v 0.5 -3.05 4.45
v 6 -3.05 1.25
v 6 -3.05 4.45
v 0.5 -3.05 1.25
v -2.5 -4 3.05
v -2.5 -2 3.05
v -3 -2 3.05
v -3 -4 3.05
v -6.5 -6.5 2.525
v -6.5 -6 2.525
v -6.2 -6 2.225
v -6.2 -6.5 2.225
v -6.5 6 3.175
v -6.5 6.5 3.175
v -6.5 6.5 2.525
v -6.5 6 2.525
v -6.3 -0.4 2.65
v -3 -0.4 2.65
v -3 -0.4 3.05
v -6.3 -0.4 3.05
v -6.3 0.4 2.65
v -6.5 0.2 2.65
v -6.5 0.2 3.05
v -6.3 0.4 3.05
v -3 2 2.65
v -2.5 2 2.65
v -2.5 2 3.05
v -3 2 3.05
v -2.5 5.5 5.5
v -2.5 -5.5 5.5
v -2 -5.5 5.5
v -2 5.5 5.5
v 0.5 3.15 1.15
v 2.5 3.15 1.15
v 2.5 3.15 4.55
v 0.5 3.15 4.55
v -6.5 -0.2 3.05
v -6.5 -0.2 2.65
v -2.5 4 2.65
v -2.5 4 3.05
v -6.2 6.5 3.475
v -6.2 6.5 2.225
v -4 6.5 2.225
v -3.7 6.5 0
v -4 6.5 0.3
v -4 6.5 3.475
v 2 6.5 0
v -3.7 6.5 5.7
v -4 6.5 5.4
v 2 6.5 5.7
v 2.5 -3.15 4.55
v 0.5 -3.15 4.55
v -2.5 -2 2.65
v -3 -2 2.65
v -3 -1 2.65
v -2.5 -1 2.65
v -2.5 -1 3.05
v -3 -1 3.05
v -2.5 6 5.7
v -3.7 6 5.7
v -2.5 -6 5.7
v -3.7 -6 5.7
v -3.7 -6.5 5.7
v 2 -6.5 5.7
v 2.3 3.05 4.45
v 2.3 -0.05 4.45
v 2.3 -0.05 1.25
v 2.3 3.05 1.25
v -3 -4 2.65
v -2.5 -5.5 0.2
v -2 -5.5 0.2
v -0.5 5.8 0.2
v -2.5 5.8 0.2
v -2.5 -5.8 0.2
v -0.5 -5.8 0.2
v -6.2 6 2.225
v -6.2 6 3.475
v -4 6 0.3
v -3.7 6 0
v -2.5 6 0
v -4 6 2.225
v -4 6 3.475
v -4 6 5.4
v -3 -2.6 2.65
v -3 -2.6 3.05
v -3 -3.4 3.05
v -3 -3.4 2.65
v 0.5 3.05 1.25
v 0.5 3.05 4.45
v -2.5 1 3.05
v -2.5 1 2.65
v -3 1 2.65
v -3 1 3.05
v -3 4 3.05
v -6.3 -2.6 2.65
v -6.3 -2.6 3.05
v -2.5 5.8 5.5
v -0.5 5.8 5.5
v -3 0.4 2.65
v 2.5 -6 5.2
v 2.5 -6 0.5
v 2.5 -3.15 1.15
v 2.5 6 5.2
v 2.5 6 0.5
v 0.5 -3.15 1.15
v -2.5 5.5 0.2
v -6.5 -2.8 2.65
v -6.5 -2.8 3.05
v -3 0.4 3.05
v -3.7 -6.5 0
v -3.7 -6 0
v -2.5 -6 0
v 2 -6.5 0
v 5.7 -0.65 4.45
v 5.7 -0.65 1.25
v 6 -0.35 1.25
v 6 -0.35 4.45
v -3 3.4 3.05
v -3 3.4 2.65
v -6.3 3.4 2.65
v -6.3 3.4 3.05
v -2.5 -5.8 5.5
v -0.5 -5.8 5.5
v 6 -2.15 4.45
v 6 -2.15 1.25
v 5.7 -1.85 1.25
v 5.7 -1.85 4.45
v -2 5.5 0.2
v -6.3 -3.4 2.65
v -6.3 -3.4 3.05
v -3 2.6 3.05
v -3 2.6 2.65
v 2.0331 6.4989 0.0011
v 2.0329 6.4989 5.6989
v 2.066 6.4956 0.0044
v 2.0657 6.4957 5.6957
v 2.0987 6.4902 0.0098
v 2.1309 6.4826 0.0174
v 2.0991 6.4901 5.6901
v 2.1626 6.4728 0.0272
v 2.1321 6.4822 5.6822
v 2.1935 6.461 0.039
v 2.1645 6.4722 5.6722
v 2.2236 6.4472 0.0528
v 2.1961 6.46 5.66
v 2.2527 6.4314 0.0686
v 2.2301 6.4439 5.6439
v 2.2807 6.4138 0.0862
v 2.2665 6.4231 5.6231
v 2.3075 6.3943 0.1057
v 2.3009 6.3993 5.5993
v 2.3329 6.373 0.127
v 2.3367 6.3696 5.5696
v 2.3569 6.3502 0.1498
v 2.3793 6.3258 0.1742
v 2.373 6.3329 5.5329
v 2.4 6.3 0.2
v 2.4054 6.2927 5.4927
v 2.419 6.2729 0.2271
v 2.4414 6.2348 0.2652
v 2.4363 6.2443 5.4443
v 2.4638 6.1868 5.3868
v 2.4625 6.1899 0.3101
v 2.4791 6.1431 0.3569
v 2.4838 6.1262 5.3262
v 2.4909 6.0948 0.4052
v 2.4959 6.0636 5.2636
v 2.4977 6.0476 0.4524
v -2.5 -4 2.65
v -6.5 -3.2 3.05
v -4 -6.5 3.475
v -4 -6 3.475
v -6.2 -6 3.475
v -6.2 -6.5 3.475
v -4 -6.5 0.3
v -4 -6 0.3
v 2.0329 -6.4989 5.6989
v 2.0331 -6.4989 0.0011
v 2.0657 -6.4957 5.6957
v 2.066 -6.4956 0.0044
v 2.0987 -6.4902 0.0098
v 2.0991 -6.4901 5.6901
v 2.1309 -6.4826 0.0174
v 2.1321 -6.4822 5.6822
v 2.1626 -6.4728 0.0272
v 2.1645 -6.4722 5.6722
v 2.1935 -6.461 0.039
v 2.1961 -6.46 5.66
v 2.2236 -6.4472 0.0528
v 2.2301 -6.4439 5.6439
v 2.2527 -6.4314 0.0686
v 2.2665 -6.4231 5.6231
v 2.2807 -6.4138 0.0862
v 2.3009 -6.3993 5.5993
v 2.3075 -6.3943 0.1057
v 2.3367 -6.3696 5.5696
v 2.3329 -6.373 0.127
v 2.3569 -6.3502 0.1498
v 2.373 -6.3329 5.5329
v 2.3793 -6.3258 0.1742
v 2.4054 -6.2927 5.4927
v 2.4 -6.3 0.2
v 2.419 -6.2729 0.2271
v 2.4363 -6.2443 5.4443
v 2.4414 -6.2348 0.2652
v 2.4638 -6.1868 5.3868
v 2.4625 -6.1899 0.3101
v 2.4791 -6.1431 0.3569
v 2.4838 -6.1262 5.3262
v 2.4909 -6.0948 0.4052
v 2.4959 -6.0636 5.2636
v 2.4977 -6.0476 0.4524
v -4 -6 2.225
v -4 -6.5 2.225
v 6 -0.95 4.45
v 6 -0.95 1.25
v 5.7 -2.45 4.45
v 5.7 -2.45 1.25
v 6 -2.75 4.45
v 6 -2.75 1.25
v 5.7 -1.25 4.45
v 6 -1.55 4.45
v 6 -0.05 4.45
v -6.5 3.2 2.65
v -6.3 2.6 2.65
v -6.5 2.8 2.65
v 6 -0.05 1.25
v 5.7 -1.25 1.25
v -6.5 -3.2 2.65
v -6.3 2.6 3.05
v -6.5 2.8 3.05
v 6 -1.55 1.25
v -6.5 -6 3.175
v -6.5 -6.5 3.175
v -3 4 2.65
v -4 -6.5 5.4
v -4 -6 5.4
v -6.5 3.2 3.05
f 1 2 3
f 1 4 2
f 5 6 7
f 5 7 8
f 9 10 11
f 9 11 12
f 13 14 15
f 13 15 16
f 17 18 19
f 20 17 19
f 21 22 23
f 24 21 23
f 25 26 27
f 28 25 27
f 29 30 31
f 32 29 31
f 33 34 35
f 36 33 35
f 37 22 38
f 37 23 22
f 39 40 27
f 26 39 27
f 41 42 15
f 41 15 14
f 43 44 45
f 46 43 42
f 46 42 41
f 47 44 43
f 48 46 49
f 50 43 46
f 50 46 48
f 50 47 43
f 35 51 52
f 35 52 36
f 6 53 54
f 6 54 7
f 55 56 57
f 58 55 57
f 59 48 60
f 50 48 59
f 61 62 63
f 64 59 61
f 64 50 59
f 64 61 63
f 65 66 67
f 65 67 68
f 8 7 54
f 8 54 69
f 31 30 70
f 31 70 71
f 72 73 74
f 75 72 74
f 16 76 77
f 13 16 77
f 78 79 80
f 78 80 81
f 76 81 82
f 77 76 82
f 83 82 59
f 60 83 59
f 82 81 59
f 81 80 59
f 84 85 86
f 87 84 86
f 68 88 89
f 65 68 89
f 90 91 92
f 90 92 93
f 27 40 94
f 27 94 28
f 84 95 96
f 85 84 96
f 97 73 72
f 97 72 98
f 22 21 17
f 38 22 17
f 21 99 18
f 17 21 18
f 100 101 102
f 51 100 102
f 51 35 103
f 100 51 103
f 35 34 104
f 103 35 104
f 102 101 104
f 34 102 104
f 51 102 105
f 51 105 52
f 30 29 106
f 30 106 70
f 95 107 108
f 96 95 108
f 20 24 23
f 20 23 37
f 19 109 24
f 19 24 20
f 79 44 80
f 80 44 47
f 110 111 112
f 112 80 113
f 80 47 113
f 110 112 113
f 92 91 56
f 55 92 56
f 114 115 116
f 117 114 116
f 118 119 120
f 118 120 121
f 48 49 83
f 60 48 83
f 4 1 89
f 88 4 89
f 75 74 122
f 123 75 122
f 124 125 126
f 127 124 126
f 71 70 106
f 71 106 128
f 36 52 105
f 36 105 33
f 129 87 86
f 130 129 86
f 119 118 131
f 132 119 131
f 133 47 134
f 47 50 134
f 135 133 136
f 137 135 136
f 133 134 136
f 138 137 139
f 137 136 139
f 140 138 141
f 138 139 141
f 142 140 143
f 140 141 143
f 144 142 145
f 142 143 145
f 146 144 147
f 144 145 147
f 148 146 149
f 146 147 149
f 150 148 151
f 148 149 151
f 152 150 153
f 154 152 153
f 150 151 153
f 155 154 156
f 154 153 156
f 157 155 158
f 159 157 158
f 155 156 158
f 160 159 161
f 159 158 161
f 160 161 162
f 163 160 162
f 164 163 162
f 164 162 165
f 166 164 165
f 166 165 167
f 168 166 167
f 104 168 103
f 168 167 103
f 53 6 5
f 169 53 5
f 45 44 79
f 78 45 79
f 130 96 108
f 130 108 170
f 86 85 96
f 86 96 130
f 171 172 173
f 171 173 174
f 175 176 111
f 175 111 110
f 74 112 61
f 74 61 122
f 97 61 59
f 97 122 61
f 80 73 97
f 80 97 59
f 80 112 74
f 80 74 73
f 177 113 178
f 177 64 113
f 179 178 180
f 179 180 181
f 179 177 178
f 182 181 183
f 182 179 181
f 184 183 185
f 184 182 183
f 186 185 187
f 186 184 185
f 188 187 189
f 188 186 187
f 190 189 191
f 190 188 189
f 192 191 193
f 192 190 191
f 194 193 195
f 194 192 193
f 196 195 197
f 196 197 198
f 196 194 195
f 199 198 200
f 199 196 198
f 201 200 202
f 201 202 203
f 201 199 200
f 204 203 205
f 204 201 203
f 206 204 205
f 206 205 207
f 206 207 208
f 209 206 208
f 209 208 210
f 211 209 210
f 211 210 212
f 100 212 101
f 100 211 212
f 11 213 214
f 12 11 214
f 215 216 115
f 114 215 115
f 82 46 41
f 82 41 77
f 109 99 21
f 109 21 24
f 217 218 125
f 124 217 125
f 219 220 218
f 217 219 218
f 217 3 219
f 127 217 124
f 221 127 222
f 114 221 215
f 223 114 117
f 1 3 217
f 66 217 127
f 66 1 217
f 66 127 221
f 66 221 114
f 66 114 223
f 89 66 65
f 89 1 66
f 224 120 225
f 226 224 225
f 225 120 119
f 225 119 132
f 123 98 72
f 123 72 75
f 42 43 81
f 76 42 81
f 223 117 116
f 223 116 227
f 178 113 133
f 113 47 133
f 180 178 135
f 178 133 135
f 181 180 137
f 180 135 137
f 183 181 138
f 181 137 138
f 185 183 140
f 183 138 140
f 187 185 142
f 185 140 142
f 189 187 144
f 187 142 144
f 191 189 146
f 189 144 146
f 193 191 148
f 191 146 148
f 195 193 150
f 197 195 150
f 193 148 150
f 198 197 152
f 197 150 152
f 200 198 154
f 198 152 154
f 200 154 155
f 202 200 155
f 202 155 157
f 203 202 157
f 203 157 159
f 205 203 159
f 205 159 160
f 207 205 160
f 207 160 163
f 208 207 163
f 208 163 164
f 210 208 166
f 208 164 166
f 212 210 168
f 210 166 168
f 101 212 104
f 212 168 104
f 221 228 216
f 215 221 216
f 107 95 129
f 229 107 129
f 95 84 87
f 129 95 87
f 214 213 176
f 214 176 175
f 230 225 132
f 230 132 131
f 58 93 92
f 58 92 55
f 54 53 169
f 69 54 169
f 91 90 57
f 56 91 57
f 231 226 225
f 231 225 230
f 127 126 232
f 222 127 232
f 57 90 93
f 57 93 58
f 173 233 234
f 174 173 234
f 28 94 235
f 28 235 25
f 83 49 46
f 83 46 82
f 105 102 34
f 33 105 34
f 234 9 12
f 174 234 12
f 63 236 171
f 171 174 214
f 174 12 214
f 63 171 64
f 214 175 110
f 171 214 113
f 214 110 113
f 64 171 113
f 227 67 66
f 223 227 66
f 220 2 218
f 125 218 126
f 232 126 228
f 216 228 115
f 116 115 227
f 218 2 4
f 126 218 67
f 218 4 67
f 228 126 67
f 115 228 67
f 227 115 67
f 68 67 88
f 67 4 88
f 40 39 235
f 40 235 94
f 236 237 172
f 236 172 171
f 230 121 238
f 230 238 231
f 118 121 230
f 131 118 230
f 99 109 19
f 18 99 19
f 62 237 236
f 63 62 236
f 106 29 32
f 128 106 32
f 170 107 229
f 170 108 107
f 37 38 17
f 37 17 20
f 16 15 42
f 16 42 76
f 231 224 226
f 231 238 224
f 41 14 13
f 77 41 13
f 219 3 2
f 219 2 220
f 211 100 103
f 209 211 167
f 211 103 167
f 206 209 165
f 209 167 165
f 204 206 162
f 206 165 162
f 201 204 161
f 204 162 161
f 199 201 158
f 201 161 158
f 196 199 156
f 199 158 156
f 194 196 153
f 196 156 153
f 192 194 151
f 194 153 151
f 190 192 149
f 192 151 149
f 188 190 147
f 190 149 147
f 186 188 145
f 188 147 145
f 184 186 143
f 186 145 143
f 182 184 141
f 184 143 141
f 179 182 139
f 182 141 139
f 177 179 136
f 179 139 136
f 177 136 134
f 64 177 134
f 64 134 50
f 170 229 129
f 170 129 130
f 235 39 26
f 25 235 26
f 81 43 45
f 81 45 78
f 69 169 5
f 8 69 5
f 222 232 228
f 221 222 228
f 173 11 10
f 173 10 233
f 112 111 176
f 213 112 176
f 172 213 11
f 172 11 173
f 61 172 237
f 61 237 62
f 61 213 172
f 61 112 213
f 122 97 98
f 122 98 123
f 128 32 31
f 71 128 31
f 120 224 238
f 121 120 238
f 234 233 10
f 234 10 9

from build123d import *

# Parameters (mm, degrees)
F0_W       = 5
F0_H       = 13
F1_DEPTH   = 5.7
F2_W       = 6.3
F2_H       = 3.4
F3_DEPTH   = 2
F4_W       = 6.1
F4_H       = 3.2
F5_DEPTH   = 1.8
F6_W       = 3
F6_H       = 3.2
F7_DEPTH   = 3.7
F8_W       = 0.5
F8_H       = 5.7
F9_DEPTH   = 1.5
F10_R      = 0.5
F11_W      = 11.6
F11_H      = 5.3
F12_DEPTH  = 2
F13_W      = 0.5
F13_H      = 11
F14_DEPTH  = 5.3
F17_DEPTH  = 25
F15_W      = 2
F15_H      = 0.4
F18_DEPTH  = 0.5
F19_W      = 0.8
F19_H      = 0.4
F22_DEPTH  = 3.5
F20_W      = 0.8
F20_H      = 0.4
F21_W      = 0.8
F21_H      = 0.4
F23_W      = 0.5
F23_H      = 1.25
F24_W      = 0.5
F24_H      = 1.25
F25_DEPTH  = 2.5
F26_SIZE   = 0.2
F26_2_SIZE = 0.2
F26_3_SIZE = 0.2
F27_SIZE   = 0.3
F28_SIZE   = 0.3


with BuildPart() as f1:
    # F0 (on Top) → F1 (new body)
    with BuildSketch(Plane.XY):
        Rectangle(F0_W, F0_H)
    extrude(amount=F1_DEPTH)

    # F2 (on face) → F3 (cut)
    with BuildSketch(Plane.YZ.offset(2.5)):
        with Locations((0, 2.85)):
            Rectangle(F2_W, F2_H)
    extrude(amount=-F3_DEPTH, mode=Mode.SUBTRACT)

    # F8 (on face) → F9 (join)
    with BuildSketch(Plane(origin=(-2.5, 0, 0), x_dir=(0, -1, 0), z_dir=(-1, 0, 0))):
        with Locations((-6.25, 2.85)):
            Rectangle(F8_W, F8_H)
        with Locations((6.25, 2.85)):
            Rectangle(F8_W, F8_H)
    extrude(amount=F9_DEPTH)

    # F10
    f10_edges = [f1.edges().sort_by_distance(p)[0] for p in [
        (2.5, 0, 5.7),
        (2.5, 6.5, 2.85),
        (2.5, 0, 0),
        (2.5, -6.5, 2.85),
    ]]
    fillet(f10_edges, radius=F10_R)

    # F11 (on face) → F12 (cut)
    with BuildSketch(Plane(origin=(-2.5, 0, 0), x_dir=(0, -1, 0), z_dir=(-1, 0, 0))):
        with Locations((0, 2.85)):
            Rectangle(F11_W, F11_H)
    extrude(amount=-F12_DEPTH, mode=Mode.SUBTRACT)

    # F23 (on face) + F24 (on face) → F25 (join)
    with BuildSketch(Plane(origin=(-4, 0, 0), x_dir=(0, -1, 0), z_dir=(-1, 0, 0))):
        with Locations((-6.25, 2.85)):
            Rectangle(F23_W, F23_H)
    with BuildSketch(Plane(origin=(-4, 0, 0), x_dir=(0, -1, 0), z_dir=(-1, 0, 0))):
        with Locations((6.25, 2.85)):
            Rectangle(F24_W, F24_H)
    extrude(amount=F25_DEPTH)

    # F27
    f27_edges = [f1.edges().sort_by_distance(p)[0] for p in [
        (-6.5, -6.25, 3.475),
        (-6.5, -6.25, 2.225),
        (-6.5, 6.25, 3.475),
        (-6.5, 6.25, 2.225),
    ]]
    chamfer(f27_edges, length=F27_SIZE)

    # F28
    f28_edges = [f1.edges().sort_by_distance(p)[0] for p in [
        (-4, 6.25, 5.7),
        (-4, 6.25, 0),
        (-4, -6.25, 5.7),
        (-4, -6.25, 0),
    ]]
    chamfer(f28_edges, length=F28_SIZE)


with BuildPart() as f5:
    # F4 (on face) → F5 (new body)
    with BuildSketch(Plane.YZ.offset(0.5)):
        with Locations((0, 2.85)):
            Rectangle(F4_W, F4_H)
    extrude(amount=F5_DEPTH)

    # F6 (on face) → F7 (join)
    with BuildSketch(Plane.YZ.offset(2.3)):
        with Locations((-1.55, 2.85)):
            Rectangle(F6_W, F6_H)
    extrude(amount=F7_DEPTH)

    # F16 (on face) → F17 (cut)
    with BuildSketch(Plane(origin=(0, 0, 1.25), x_dir=(1, 0, 0), z_dir=(0, 0, -1))):
        Polygon((6, 2.15), (6, 2.75), (5.7, 2.45), align=None)
        Polygon((6, 1.55), (6, 2.15), (5.7, 1.85), align=None)
        Polygon((6, 0.95), (6, 1.55), (5.7, 1.25), align=None)
        Polygon((6, 0.35), (6, 0.95), (5.7, 0.65), align=None)
    extrude(amount=-F17_DEPTH, mode=Mode.SUBTRACT)


with BuildPart() as f14:
    # F13 (on face) → F14 (new body)
    with BuildSketch(Plane(origin=(0, 0, 5.5), x_dir=(1, 0, 0), z_dir=(0, 0, -1))):
        with Locations((-2.25, 0)):
            Rectangle(F13_W, F13_H)
    extrude(amount=F14_DEPTH)


with BuildPart() as f18:
    # F15 (on face) → F18 (new body)
    with BuildSketch(Plane(origin=(-2.5, 0, 0), x_dir=(0, -1, 0), z_dir=(-1, 0, 0))):
        with Locations((-3, 2.85)):
            Rectangle(F15_W, F15_H)
    extrude(amount=F18_DEPTH)


with BuildPart() as f18b:
    # F15 (on face) → F18, piece 2 (new body)
    with BuildSketch(Plane(origin=(-2.5, 0, 0), x_dir=(0, -1, 0), z_dir=(-1, 0, 0))):
        with Locations((0, 2.85)):
            Rectangle(F15_W, F15_H)
    extrude(amount=F18_DEPTH)


with BuildPart() as f18c:
    # F15 (on face) → F18, piece 3 (new body)
    with BuildSketch(Plane(origin=(-2.5, 0, 0), x_dir=(0, -1, 0), z_dir=(-1, 0, 0))):
        with Locations((3, 2.85)):
            Rectangle(F15_W, F15_H)
    extrude(amount=F18_DEPTH)


with BuildPart() as f22:
    # F19 (on face) → F22 (new body)
    with BuildSketch(Plane(origin=(-3, 0, 0), x_dir=(0, -1, 0), z_dir=(-1, 0, 0))):
        with Locations((-3, 2.85)):
            Rectangle(F19_W, F19_H)
    extrude(amount=F22_DEPTH)

    # F26
    f26_edges = [f22.edges().sort_by_distance(p)[0] for p in [
        (-6.5, 3.4, 2.85),
        (-6.5, 2.6, 2.85),
    ]]
    chamfer(f26_edges, length=F26_SIZE)


with BuildPart() as f22b:
    # F20 (on face) → F22, piece 2 (new body)
    with BuildSketch(Plane(origin=(-3, 0, 0), x_dir=(0, -1, 0), z_dir=(-1, 0, 0))):
        with Locations((0, 2.85)):
            Rectangle(F20_W, F20_H)
    extrude(amount=F22_DEPTH)

    # F26#2
    f26_2_edges = [f22b.edges().sort_by_distance(p)[0] for p in [
        (-6.5, 0.4, 2.85),
        (-6.5, -0.4, 2.85),
    ]]
    chamfer(f26_2_edges, length=F26_2_SIZE)


with BuildPart() as f22c:
    # F21 (on face) → F22, piece 3 (new body)
    with BuildSketch(Plane(origin=(-3, 0, 0), x_dir=(0, -1, 0), z_dir=(-1, 0, 0))):
        with Locations((3, 2.85)):
            Rectangle(F21_W, F21_H)
    extrude(amount=F22_DEPTH)

    # F26#3
    f26_3_edges = [f22c.edges().sort_by_distance(p)[0] for p in [
        (-6.5, -2.6, 2.85),
        (-6.5, -3.4, 2.85),
    ]]
    chamfer(f26_3_edges, length=F26_3_SIZE)


solid = Compound([f1.part, f5.part, f14.part, f18.part, f18b.part, f18c.part, f22.part, f22b.part, f22c.part])
